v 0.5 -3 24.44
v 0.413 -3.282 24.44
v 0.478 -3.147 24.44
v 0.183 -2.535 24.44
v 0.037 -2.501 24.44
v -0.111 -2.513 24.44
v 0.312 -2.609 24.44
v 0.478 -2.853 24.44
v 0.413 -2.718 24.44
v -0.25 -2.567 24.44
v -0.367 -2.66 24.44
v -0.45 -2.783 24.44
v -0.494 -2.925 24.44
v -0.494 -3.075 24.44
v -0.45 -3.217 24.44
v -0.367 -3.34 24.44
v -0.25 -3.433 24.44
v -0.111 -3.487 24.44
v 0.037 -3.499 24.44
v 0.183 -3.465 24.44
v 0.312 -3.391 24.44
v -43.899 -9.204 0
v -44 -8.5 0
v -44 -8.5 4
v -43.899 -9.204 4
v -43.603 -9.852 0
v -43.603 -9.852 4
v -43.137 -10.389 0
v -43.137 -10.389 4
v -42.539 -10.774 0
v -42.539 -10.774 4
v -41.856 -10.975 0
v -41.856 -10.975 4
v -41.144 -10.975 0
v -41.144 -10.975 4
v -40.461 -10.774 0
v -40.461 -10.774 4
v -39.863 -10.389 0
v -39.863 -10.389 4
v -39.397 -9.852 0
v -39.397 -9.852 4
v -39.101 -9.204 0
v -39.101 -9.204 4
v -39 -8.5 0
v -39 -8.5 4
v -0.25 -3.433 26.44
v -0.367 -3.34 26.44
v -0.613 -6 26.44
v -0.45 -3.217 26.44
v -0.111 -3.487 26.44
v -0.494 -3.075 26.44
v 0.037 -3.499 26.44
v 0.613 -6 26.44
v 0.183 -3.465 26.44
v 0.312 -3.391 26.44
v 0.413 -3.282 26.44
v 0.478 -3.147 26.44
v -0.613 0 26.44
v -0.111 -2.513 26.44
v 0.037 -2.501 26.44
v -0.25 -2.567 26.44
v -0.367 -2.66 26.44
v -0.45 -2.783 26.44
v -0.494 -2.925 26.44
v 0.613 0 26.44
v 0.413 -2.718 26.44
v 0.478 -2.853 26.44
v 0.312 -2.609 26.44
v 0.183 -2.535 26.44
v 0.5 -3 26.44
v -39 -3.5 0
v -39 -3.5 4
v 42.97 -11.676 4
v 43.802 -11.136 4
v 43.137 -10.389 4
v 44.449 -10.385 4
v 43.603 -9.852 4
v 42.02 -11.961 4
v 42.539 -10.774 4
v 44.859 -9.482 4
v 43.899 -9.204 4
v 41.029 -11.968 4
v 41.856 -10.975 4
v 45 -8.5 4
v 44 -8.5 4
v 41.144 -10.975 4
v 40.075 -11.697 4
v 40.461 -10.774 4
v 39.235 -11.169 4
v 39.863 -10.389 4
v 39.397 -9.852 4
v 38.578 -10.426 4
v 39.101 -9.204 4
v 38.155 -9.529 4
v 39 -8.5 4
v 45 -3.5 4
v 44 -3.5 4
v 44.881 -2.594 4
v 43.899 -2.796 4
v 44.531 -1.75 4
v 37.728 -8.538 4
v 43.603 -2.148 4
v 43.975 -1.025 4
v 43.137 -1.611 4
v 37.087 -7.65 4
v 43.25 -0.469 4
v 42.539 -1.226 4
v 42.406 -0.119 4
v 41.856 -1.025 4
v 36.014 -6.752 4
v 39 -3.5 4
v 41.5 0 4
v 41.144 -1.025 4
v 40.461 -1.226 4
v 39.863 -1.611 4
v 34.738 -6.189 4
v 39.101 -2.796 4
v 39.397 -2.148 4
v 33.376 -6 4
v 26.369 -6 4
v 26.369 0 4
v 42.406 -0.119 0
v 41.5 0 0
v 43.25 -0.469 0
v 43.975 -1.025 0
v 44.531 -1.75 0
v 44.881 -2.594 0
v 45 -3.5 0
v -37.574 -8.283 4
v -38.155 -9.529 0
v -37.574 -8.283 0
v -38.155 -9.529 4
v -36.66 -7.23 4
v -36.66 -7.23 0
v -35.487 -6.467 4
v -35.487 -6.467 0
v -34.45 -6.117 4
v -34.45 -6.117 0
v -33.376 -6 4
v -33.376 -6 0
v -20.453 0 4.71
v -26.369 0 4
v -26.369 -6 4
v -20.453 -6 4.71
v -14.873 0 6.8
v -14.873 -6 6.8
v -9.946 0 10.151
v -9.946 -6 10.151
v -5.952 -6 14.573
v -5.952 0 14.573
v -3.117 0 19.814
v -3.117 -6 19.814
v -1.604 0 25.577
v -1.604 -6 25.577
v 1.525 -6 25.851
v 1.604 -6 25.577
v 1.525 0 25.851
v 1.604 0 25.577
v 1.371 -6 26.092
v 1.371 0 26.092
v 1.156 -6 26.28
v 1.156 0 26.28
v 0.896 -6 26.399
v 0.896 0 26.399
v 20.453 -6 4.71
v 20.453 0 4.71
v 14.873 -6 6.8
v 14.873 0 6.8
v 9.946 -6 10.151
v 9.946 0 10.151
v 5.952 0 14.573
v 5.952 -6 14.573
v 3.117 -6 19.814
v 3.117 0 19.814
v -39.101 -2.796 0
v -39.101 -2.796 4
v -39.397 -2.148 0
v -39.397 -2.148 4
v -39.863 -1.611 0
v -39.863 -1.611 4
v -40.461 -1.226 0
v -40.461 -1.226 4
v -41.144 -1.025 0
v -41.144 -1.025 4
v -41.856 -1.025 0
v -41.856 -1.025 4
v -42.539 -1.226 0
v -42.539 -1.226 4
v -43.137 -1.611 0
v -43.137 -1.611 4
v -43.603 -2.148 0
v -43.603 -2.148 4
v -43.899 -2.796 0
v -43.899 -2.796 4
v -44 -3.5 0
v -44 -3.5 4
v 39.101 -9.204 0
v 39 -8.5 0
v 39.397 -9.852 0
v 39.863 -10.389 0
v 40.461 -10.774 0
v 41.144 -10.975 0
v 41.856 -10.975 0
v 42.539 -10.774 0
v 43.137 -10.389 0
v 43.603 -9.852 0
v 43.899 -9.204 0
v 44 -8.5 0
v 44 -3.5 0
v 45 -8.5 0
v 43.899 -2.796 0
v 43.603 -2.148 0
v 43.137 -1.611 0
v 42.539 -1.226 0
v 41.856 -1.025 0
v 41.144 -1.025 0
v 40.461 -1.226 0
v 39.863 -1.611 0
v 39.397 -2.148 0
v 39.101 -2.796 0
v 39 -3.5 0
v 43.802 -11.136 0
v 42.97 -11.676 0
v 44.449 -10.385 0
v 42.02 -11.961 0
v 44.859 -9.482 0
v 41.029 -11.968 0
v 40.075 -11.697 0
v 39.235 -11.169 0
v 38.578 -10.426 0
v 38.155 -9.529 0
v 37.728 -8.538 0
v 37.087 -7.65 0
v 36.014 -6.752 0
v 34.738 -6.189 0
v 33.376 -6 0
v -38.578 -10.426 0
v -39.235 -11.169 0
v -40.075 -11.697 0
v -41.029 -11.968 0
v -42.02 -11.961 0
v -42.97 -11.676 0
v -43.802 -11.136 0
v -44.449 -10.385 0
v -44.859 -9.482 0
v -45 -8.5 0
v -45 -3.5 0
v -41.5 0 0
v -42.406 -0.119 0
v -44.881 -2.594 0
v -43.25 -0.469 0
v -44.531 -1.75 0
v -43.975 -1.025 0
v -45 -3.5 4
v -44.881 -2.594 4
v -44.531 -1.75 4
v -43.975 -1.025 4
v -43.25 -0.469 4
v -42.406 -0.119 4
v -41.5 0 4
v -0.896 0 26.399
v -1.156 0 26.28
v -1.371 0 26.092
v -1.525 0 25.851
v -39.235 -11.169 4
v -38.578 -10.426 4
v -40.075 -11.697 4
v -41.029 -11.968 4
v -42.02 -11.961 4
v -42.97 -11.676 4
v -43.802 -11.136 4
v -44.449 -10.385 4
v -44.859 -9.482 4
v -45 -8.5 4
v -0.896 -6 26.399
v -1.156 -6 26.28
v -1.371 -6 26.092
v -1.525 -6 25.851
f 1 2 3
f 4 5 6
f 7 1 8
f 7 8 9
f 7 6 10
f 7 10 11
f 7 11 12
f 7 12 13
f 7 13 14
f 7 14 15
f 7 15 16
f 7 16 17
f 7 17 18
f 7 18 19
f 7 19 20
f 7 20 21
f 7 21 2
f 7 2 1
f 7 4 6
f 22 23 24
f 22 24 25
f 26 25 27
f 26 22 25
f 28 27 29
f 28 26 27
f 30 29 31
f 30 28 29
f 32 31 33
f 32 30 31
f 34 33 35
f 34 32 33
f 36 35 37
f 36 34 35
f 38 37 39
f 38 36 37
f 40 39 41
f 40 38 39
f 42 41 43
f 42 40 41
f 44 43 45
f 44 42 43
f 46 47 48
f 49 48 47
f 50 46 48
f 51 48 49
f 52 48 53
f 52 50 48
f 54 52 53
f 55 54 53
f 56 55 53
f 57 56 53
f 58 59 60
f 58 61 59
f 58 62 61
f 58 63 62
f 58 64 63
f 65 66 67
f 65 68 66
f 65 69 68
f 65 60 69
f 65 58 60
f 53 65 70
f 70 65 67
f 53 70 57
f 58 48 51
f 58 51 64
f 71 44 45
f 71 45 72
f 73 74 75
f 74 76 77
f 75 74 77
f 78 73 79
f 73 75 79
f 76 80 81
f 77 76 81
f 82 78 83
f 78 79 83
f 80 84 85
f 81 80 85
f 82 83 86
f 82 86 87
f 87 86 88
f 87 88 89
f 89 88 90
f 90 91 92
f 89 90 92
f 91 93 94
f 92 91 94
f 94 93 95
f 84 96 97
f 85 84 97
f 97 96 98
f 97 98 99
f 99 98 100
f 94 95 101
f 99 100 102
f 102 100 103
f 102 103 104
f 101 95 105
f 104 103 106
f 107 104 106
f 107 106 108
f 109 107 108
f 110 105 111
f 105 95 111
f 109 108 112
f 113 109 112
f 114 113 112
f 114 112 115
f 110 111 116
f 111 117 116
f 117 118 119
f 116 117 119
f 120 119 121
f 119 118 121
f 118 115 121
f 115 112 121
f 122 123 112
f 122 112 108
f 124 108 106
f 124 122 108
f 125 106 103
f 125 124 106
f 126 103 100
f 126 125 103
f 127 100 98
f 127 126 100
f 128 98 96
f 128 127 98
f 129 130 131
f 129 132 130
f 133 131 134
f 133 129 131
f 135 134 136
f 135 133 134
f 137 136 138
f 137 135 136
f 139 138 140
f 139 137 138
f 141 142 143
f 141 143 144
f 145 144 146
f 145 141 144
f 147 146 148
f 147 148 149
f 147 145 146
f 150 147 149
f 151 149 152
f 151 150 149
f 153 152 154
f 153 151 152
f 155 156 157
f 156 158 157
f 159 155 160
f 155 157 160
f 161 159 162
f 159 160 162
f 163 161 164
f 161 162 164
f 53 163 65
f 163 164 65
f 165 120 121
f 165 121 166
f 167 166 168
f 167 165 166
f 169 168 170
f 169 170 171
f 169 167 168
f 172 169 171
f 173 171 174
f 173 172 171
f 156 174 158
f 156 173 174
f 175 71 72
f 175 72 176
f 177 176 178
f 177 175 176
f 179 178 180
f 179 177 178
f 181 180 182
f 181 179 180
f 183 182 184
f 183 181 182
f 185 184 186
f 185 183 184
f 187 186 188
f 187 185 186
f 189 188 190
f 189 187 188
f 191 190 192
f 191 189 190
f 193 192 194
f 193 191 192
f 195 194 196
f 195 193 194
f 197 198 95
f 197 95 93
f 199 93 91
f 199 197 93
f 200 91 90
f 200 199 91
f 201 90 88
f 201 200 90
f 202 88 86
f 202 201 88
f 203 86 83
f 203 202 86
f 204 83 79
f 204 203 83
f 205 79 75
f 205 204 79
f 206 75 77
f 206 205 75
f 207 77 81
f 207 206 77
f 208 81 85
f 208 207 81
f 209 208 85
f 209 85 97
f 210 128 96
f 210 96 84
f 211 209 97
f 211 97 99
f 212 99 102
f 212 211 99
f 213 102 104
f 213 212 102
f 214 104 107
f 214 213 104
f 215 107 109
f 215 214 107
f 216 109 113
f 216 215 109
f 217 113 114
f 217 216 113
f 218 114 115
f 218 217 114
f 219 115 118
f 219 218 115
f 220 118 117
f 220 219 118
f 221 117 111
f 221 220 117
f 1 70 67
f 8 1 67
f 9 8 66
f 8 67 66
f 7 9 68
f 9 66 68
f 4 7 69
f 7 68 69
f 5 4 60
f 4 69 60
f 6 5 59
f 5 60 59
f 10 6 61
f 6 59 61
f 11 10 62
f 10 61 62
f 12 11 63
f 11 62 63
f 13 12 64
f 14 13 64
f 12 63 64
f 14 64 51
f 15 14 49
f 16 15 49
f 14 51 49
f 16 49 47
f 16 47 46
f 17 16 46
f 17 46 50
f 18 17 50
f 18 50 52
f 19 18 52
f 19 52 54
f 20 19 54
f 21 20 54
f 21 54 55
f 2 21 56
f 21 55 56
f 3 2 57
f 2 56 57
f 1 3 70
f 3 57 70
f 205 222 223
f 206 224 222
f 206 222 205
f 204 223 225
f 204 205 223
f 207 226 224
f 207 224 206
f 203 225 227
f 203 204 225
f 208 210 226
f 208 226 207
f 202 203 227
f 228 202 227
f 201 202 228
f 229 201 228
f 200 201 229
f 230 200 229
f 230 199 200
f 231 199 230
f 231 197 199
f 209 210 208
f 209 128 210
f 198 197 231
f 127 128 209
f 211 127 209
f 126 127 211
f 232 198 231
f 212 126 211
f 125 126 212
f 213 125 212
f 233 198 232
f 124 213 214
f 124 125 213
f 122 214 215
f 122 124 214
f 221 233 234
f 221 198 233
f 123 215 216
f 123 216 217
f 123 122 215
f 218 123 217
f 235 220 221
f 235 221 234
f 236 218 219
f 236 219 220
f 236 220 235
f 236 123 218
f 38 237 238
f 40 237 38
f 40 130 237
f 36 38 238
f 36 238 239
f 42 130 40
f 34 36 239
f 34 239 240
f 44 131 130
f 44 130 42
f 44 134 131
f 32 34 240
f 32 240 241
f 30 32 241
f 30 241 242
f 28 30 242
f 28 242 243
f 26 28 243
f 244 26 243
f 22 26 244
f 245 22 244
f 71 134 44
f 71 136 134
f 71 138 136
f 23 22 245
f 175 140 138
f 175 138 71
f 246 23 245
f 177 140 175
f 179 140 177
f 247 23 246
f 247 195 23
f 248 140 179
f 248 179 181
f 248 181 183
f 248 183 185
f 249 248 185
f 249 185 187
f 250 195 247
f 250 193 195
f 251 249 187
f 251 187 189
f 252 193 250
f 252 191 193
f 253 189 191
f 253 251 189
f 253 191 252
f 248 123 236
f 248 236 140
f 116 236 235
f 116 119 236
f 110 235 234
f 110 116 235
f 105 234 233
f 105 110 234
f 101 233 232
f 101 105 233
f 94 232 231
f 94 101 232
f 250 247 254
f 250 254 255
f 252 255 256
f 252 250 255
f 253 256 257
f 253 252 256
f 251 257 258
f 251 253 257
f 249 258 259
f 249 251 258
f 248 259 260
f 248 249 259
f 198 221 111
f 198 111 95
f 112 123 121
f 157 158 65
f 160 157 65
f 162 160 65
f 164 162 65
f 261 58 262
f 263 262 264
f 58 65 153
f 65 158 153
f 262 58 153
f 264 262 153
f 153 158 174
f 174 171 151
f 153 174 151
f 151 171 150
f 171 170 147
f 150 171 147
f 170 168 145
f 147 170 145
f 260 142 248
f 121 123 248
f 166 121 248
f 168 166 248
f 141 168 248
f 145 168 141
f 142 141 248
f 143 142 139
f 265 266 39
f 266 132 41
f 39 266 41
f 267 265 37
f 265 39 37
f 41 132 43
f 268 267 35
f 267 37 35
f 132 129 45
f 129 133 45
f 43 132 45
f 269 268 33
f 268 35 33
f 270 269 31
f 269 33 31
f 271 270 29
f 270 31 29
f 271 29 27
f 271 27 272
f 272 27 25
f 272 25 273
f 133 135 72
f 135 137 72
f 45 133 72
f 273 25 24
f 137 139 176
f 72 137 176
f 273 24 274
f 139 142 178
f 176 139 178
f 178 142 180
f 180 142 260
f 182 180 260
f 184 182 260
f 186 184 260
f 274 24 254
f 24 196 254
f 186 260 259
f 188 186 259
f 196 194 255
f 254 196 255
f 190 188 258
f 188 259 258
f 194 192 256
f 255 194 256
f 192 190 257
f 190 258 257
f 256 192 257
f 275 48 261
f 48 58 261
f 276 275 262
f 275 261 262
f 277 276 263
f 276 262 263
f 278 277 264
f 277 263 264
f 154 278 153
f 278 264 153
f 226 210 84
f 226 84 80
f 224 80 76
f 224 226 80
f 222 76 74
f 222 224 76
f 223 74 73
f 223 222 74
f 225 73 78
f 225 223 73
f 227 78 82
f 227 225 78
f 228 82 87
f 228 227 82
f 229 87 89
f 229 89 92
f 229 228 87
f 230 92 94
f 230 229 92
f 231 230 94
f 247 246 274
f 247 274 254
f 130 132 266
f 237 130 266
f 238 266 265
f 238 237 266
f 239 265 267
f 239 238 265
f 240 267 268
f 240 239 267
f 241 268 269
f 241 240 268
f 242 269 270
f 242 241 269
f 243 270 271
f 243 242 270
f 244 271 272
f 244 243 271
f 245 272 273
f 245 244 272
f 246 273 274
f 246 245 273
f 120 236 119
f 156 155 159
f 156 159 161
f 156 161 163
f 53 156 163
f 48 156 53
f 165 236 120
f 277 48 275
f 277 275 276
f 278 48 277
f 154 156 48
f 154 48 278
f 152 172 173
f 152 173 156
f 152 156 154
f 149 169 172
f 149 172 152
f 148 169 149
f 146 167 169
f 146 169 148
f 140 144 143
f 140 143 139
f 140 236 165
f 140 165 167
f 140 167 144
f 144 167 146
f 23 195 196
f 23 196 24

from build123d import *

# Parameters (mm, degrees)
SALIENTE_EXTRUIR1_DEPTH = 4
REDONDEO1_R             = 5
CROQUIS2_W              = 3
CROQUIS2_H              = 6
SALIENTE_EXTRUIR2_DEPTH = 22.44
REDONDEO2_R             = 25
CROQUIS3_R              = 0.5
CORTAR_EXTRUIR1_DEPTH   = 2
REDONDEO3_R             = 1


with BuildPart() as part:
    # Croquis1 → Saliente-Extruir1 (new body)
    # profile 1 of 4: a face of its own
    with BuildSketch(Plane.XY):
        with BuildLine():
            Line((-38, -3.5), (-38, -8.5))
            ThreePointArc((-38, -8.5), (-41.5, -12), (-45, -8.5))
            Line((-45, -8.5), (-45, -3.5))
            ThreePointArc((-45, -3.5), (-41.5, 0), (-38, -3.5))
        make_face()
        with BuildLine():
            ThreePointArc((-44, -8.5), (-41.5, -11), (-39, -8.5))
            Line((-39, -8.5), (-39, -3.5))
            ThreePointArc((-39, -3.5), (-41.5, -1), (-44, -3.5))
            Line((-44, -3.5), (-44, -8.5))
        make_face(mode=Mode.SUBTRACT)
    # profile 2 of 4: a face of its own
    with BuildSketch(Plane.XY):
        with BuildLine():
            Line((0, 0), (-41.5, 0))
            ThreePointArc((-41.5, 0), (-39.025126266, -1.025126266), (-38, -3.5))
            Line((-38, -3.5), (-38, -6))
            Line((-38, -6), (0, -6))
            Line((0, -6), (0, 0))
        make_face()
    # profile 3 of 4: a face of its own
    with BuildSketch(Plane.XY):
        with BuildLine():
            Line((41.5, 0), (0, 0))
            Line((0, 0), (0, -6))
            Line((0, -6), (38, -6))
            Line((38, -6), (38, -3.5))
            ThreePointArc((38, -3.5), (39.025126266, -1.025126266), (41.5, 0))
        make_face()
    # profile 4 of 4: a face of its own
    with BuildSketch(Plane.XY):
        with BuildLine():
            ThreePointArc((45, -8.5), (41.5, -12), (38, -8.5))
            Line((38, -8.5), (38, -3.5))
            ThreePointArc((38, -3.5), (41.5, 0), (45, -3.5))
            Line((45, -3.5), (45, -8.5))
        make_face()
        with BuildLine():
            Line((39, -3.5), (39, -8.5))
            ThreePointArc((39, -8.5), (41.5, -11), (44, -8.5))
            Line((44, -8.5), (44, -3.5))
            ThreePointArc((44, -3.5), (41.5, -1), (39, -3.5))
        make_face(mode=Mode.SUBTRACT)
    extrude(amount=SALIENTE_EXTRUIR1_DEPTH)

    # Redondeo1
    redondeo1_edges = [part.edges().sort_by_distance(p)[0] for p in [
        (38, -6, 2),
        (-38, -6, 2),
    ]]
    fillet(redondeo1_edges, radius=REDONDEO1_R)

    # Croquis2 → Saliente-Extruir2 (add)
    with BuildSketch(Plane.XY.offset(4)):
        with Locations((0, -3)):
            Rectangle(CROQUIS2_W, CROQUIS2_H)
    extrude(amount=SALIENTE_EXTRUIR2_DEPTH)

    # Redondeo2
    # the kernel refuses this fillet: 25 mm, written as the material it adds along each edge
    with BuildSketch(Plane(origin=(1.5, -6, 4), x_dir=(1, 0, 0), z_dir=(0, 1, 0)), Plane(origin=(-1.5, 0, 4), x_dir=(-1, 0, 0), z_dir=(0, -1, 0))) as redondeo2_piece_1:
        with BuildLine():
            CenterArc((24.868582589, -25), REDONDEO2_R, 90, 84.122610013)
            Line((0, -22.44), (-0.497371652, -22.3888))
            ThreePointArc((-0.497371652, -22.3888), (-0.5, -11.22), (-0.5, 0))
            Line((-0.5, 0), (0, 0.5))
            Line((0, 0.5), (24.868582589, 0.5))
            Line((24.868582589, 0.5), (24.868582589, 0))
        make_face()
    extrude(amount=6)

    # Croquis3 → Cortar-Extruir1 (cut)
    with BuildSketch(Plane.XY.offset(26.44)):
        with Locations((0, -3)):
            Circle(CROQUIS3_R)
    extrude(amount=-CORTAR_EXTRUIR1_DEPTH, mode=Mode.SUBTRACT)

    # Redondeo3
    redondeo3_edges = [part.edges().sort_by_distance(p)[0] for p in [
        (-1.5, -3, 26.44),
        (1.5, -3, 26.44),
    ]]
    fillet(redondeo3_edges, radius=REDONDEO3_R)


solid = part.part
